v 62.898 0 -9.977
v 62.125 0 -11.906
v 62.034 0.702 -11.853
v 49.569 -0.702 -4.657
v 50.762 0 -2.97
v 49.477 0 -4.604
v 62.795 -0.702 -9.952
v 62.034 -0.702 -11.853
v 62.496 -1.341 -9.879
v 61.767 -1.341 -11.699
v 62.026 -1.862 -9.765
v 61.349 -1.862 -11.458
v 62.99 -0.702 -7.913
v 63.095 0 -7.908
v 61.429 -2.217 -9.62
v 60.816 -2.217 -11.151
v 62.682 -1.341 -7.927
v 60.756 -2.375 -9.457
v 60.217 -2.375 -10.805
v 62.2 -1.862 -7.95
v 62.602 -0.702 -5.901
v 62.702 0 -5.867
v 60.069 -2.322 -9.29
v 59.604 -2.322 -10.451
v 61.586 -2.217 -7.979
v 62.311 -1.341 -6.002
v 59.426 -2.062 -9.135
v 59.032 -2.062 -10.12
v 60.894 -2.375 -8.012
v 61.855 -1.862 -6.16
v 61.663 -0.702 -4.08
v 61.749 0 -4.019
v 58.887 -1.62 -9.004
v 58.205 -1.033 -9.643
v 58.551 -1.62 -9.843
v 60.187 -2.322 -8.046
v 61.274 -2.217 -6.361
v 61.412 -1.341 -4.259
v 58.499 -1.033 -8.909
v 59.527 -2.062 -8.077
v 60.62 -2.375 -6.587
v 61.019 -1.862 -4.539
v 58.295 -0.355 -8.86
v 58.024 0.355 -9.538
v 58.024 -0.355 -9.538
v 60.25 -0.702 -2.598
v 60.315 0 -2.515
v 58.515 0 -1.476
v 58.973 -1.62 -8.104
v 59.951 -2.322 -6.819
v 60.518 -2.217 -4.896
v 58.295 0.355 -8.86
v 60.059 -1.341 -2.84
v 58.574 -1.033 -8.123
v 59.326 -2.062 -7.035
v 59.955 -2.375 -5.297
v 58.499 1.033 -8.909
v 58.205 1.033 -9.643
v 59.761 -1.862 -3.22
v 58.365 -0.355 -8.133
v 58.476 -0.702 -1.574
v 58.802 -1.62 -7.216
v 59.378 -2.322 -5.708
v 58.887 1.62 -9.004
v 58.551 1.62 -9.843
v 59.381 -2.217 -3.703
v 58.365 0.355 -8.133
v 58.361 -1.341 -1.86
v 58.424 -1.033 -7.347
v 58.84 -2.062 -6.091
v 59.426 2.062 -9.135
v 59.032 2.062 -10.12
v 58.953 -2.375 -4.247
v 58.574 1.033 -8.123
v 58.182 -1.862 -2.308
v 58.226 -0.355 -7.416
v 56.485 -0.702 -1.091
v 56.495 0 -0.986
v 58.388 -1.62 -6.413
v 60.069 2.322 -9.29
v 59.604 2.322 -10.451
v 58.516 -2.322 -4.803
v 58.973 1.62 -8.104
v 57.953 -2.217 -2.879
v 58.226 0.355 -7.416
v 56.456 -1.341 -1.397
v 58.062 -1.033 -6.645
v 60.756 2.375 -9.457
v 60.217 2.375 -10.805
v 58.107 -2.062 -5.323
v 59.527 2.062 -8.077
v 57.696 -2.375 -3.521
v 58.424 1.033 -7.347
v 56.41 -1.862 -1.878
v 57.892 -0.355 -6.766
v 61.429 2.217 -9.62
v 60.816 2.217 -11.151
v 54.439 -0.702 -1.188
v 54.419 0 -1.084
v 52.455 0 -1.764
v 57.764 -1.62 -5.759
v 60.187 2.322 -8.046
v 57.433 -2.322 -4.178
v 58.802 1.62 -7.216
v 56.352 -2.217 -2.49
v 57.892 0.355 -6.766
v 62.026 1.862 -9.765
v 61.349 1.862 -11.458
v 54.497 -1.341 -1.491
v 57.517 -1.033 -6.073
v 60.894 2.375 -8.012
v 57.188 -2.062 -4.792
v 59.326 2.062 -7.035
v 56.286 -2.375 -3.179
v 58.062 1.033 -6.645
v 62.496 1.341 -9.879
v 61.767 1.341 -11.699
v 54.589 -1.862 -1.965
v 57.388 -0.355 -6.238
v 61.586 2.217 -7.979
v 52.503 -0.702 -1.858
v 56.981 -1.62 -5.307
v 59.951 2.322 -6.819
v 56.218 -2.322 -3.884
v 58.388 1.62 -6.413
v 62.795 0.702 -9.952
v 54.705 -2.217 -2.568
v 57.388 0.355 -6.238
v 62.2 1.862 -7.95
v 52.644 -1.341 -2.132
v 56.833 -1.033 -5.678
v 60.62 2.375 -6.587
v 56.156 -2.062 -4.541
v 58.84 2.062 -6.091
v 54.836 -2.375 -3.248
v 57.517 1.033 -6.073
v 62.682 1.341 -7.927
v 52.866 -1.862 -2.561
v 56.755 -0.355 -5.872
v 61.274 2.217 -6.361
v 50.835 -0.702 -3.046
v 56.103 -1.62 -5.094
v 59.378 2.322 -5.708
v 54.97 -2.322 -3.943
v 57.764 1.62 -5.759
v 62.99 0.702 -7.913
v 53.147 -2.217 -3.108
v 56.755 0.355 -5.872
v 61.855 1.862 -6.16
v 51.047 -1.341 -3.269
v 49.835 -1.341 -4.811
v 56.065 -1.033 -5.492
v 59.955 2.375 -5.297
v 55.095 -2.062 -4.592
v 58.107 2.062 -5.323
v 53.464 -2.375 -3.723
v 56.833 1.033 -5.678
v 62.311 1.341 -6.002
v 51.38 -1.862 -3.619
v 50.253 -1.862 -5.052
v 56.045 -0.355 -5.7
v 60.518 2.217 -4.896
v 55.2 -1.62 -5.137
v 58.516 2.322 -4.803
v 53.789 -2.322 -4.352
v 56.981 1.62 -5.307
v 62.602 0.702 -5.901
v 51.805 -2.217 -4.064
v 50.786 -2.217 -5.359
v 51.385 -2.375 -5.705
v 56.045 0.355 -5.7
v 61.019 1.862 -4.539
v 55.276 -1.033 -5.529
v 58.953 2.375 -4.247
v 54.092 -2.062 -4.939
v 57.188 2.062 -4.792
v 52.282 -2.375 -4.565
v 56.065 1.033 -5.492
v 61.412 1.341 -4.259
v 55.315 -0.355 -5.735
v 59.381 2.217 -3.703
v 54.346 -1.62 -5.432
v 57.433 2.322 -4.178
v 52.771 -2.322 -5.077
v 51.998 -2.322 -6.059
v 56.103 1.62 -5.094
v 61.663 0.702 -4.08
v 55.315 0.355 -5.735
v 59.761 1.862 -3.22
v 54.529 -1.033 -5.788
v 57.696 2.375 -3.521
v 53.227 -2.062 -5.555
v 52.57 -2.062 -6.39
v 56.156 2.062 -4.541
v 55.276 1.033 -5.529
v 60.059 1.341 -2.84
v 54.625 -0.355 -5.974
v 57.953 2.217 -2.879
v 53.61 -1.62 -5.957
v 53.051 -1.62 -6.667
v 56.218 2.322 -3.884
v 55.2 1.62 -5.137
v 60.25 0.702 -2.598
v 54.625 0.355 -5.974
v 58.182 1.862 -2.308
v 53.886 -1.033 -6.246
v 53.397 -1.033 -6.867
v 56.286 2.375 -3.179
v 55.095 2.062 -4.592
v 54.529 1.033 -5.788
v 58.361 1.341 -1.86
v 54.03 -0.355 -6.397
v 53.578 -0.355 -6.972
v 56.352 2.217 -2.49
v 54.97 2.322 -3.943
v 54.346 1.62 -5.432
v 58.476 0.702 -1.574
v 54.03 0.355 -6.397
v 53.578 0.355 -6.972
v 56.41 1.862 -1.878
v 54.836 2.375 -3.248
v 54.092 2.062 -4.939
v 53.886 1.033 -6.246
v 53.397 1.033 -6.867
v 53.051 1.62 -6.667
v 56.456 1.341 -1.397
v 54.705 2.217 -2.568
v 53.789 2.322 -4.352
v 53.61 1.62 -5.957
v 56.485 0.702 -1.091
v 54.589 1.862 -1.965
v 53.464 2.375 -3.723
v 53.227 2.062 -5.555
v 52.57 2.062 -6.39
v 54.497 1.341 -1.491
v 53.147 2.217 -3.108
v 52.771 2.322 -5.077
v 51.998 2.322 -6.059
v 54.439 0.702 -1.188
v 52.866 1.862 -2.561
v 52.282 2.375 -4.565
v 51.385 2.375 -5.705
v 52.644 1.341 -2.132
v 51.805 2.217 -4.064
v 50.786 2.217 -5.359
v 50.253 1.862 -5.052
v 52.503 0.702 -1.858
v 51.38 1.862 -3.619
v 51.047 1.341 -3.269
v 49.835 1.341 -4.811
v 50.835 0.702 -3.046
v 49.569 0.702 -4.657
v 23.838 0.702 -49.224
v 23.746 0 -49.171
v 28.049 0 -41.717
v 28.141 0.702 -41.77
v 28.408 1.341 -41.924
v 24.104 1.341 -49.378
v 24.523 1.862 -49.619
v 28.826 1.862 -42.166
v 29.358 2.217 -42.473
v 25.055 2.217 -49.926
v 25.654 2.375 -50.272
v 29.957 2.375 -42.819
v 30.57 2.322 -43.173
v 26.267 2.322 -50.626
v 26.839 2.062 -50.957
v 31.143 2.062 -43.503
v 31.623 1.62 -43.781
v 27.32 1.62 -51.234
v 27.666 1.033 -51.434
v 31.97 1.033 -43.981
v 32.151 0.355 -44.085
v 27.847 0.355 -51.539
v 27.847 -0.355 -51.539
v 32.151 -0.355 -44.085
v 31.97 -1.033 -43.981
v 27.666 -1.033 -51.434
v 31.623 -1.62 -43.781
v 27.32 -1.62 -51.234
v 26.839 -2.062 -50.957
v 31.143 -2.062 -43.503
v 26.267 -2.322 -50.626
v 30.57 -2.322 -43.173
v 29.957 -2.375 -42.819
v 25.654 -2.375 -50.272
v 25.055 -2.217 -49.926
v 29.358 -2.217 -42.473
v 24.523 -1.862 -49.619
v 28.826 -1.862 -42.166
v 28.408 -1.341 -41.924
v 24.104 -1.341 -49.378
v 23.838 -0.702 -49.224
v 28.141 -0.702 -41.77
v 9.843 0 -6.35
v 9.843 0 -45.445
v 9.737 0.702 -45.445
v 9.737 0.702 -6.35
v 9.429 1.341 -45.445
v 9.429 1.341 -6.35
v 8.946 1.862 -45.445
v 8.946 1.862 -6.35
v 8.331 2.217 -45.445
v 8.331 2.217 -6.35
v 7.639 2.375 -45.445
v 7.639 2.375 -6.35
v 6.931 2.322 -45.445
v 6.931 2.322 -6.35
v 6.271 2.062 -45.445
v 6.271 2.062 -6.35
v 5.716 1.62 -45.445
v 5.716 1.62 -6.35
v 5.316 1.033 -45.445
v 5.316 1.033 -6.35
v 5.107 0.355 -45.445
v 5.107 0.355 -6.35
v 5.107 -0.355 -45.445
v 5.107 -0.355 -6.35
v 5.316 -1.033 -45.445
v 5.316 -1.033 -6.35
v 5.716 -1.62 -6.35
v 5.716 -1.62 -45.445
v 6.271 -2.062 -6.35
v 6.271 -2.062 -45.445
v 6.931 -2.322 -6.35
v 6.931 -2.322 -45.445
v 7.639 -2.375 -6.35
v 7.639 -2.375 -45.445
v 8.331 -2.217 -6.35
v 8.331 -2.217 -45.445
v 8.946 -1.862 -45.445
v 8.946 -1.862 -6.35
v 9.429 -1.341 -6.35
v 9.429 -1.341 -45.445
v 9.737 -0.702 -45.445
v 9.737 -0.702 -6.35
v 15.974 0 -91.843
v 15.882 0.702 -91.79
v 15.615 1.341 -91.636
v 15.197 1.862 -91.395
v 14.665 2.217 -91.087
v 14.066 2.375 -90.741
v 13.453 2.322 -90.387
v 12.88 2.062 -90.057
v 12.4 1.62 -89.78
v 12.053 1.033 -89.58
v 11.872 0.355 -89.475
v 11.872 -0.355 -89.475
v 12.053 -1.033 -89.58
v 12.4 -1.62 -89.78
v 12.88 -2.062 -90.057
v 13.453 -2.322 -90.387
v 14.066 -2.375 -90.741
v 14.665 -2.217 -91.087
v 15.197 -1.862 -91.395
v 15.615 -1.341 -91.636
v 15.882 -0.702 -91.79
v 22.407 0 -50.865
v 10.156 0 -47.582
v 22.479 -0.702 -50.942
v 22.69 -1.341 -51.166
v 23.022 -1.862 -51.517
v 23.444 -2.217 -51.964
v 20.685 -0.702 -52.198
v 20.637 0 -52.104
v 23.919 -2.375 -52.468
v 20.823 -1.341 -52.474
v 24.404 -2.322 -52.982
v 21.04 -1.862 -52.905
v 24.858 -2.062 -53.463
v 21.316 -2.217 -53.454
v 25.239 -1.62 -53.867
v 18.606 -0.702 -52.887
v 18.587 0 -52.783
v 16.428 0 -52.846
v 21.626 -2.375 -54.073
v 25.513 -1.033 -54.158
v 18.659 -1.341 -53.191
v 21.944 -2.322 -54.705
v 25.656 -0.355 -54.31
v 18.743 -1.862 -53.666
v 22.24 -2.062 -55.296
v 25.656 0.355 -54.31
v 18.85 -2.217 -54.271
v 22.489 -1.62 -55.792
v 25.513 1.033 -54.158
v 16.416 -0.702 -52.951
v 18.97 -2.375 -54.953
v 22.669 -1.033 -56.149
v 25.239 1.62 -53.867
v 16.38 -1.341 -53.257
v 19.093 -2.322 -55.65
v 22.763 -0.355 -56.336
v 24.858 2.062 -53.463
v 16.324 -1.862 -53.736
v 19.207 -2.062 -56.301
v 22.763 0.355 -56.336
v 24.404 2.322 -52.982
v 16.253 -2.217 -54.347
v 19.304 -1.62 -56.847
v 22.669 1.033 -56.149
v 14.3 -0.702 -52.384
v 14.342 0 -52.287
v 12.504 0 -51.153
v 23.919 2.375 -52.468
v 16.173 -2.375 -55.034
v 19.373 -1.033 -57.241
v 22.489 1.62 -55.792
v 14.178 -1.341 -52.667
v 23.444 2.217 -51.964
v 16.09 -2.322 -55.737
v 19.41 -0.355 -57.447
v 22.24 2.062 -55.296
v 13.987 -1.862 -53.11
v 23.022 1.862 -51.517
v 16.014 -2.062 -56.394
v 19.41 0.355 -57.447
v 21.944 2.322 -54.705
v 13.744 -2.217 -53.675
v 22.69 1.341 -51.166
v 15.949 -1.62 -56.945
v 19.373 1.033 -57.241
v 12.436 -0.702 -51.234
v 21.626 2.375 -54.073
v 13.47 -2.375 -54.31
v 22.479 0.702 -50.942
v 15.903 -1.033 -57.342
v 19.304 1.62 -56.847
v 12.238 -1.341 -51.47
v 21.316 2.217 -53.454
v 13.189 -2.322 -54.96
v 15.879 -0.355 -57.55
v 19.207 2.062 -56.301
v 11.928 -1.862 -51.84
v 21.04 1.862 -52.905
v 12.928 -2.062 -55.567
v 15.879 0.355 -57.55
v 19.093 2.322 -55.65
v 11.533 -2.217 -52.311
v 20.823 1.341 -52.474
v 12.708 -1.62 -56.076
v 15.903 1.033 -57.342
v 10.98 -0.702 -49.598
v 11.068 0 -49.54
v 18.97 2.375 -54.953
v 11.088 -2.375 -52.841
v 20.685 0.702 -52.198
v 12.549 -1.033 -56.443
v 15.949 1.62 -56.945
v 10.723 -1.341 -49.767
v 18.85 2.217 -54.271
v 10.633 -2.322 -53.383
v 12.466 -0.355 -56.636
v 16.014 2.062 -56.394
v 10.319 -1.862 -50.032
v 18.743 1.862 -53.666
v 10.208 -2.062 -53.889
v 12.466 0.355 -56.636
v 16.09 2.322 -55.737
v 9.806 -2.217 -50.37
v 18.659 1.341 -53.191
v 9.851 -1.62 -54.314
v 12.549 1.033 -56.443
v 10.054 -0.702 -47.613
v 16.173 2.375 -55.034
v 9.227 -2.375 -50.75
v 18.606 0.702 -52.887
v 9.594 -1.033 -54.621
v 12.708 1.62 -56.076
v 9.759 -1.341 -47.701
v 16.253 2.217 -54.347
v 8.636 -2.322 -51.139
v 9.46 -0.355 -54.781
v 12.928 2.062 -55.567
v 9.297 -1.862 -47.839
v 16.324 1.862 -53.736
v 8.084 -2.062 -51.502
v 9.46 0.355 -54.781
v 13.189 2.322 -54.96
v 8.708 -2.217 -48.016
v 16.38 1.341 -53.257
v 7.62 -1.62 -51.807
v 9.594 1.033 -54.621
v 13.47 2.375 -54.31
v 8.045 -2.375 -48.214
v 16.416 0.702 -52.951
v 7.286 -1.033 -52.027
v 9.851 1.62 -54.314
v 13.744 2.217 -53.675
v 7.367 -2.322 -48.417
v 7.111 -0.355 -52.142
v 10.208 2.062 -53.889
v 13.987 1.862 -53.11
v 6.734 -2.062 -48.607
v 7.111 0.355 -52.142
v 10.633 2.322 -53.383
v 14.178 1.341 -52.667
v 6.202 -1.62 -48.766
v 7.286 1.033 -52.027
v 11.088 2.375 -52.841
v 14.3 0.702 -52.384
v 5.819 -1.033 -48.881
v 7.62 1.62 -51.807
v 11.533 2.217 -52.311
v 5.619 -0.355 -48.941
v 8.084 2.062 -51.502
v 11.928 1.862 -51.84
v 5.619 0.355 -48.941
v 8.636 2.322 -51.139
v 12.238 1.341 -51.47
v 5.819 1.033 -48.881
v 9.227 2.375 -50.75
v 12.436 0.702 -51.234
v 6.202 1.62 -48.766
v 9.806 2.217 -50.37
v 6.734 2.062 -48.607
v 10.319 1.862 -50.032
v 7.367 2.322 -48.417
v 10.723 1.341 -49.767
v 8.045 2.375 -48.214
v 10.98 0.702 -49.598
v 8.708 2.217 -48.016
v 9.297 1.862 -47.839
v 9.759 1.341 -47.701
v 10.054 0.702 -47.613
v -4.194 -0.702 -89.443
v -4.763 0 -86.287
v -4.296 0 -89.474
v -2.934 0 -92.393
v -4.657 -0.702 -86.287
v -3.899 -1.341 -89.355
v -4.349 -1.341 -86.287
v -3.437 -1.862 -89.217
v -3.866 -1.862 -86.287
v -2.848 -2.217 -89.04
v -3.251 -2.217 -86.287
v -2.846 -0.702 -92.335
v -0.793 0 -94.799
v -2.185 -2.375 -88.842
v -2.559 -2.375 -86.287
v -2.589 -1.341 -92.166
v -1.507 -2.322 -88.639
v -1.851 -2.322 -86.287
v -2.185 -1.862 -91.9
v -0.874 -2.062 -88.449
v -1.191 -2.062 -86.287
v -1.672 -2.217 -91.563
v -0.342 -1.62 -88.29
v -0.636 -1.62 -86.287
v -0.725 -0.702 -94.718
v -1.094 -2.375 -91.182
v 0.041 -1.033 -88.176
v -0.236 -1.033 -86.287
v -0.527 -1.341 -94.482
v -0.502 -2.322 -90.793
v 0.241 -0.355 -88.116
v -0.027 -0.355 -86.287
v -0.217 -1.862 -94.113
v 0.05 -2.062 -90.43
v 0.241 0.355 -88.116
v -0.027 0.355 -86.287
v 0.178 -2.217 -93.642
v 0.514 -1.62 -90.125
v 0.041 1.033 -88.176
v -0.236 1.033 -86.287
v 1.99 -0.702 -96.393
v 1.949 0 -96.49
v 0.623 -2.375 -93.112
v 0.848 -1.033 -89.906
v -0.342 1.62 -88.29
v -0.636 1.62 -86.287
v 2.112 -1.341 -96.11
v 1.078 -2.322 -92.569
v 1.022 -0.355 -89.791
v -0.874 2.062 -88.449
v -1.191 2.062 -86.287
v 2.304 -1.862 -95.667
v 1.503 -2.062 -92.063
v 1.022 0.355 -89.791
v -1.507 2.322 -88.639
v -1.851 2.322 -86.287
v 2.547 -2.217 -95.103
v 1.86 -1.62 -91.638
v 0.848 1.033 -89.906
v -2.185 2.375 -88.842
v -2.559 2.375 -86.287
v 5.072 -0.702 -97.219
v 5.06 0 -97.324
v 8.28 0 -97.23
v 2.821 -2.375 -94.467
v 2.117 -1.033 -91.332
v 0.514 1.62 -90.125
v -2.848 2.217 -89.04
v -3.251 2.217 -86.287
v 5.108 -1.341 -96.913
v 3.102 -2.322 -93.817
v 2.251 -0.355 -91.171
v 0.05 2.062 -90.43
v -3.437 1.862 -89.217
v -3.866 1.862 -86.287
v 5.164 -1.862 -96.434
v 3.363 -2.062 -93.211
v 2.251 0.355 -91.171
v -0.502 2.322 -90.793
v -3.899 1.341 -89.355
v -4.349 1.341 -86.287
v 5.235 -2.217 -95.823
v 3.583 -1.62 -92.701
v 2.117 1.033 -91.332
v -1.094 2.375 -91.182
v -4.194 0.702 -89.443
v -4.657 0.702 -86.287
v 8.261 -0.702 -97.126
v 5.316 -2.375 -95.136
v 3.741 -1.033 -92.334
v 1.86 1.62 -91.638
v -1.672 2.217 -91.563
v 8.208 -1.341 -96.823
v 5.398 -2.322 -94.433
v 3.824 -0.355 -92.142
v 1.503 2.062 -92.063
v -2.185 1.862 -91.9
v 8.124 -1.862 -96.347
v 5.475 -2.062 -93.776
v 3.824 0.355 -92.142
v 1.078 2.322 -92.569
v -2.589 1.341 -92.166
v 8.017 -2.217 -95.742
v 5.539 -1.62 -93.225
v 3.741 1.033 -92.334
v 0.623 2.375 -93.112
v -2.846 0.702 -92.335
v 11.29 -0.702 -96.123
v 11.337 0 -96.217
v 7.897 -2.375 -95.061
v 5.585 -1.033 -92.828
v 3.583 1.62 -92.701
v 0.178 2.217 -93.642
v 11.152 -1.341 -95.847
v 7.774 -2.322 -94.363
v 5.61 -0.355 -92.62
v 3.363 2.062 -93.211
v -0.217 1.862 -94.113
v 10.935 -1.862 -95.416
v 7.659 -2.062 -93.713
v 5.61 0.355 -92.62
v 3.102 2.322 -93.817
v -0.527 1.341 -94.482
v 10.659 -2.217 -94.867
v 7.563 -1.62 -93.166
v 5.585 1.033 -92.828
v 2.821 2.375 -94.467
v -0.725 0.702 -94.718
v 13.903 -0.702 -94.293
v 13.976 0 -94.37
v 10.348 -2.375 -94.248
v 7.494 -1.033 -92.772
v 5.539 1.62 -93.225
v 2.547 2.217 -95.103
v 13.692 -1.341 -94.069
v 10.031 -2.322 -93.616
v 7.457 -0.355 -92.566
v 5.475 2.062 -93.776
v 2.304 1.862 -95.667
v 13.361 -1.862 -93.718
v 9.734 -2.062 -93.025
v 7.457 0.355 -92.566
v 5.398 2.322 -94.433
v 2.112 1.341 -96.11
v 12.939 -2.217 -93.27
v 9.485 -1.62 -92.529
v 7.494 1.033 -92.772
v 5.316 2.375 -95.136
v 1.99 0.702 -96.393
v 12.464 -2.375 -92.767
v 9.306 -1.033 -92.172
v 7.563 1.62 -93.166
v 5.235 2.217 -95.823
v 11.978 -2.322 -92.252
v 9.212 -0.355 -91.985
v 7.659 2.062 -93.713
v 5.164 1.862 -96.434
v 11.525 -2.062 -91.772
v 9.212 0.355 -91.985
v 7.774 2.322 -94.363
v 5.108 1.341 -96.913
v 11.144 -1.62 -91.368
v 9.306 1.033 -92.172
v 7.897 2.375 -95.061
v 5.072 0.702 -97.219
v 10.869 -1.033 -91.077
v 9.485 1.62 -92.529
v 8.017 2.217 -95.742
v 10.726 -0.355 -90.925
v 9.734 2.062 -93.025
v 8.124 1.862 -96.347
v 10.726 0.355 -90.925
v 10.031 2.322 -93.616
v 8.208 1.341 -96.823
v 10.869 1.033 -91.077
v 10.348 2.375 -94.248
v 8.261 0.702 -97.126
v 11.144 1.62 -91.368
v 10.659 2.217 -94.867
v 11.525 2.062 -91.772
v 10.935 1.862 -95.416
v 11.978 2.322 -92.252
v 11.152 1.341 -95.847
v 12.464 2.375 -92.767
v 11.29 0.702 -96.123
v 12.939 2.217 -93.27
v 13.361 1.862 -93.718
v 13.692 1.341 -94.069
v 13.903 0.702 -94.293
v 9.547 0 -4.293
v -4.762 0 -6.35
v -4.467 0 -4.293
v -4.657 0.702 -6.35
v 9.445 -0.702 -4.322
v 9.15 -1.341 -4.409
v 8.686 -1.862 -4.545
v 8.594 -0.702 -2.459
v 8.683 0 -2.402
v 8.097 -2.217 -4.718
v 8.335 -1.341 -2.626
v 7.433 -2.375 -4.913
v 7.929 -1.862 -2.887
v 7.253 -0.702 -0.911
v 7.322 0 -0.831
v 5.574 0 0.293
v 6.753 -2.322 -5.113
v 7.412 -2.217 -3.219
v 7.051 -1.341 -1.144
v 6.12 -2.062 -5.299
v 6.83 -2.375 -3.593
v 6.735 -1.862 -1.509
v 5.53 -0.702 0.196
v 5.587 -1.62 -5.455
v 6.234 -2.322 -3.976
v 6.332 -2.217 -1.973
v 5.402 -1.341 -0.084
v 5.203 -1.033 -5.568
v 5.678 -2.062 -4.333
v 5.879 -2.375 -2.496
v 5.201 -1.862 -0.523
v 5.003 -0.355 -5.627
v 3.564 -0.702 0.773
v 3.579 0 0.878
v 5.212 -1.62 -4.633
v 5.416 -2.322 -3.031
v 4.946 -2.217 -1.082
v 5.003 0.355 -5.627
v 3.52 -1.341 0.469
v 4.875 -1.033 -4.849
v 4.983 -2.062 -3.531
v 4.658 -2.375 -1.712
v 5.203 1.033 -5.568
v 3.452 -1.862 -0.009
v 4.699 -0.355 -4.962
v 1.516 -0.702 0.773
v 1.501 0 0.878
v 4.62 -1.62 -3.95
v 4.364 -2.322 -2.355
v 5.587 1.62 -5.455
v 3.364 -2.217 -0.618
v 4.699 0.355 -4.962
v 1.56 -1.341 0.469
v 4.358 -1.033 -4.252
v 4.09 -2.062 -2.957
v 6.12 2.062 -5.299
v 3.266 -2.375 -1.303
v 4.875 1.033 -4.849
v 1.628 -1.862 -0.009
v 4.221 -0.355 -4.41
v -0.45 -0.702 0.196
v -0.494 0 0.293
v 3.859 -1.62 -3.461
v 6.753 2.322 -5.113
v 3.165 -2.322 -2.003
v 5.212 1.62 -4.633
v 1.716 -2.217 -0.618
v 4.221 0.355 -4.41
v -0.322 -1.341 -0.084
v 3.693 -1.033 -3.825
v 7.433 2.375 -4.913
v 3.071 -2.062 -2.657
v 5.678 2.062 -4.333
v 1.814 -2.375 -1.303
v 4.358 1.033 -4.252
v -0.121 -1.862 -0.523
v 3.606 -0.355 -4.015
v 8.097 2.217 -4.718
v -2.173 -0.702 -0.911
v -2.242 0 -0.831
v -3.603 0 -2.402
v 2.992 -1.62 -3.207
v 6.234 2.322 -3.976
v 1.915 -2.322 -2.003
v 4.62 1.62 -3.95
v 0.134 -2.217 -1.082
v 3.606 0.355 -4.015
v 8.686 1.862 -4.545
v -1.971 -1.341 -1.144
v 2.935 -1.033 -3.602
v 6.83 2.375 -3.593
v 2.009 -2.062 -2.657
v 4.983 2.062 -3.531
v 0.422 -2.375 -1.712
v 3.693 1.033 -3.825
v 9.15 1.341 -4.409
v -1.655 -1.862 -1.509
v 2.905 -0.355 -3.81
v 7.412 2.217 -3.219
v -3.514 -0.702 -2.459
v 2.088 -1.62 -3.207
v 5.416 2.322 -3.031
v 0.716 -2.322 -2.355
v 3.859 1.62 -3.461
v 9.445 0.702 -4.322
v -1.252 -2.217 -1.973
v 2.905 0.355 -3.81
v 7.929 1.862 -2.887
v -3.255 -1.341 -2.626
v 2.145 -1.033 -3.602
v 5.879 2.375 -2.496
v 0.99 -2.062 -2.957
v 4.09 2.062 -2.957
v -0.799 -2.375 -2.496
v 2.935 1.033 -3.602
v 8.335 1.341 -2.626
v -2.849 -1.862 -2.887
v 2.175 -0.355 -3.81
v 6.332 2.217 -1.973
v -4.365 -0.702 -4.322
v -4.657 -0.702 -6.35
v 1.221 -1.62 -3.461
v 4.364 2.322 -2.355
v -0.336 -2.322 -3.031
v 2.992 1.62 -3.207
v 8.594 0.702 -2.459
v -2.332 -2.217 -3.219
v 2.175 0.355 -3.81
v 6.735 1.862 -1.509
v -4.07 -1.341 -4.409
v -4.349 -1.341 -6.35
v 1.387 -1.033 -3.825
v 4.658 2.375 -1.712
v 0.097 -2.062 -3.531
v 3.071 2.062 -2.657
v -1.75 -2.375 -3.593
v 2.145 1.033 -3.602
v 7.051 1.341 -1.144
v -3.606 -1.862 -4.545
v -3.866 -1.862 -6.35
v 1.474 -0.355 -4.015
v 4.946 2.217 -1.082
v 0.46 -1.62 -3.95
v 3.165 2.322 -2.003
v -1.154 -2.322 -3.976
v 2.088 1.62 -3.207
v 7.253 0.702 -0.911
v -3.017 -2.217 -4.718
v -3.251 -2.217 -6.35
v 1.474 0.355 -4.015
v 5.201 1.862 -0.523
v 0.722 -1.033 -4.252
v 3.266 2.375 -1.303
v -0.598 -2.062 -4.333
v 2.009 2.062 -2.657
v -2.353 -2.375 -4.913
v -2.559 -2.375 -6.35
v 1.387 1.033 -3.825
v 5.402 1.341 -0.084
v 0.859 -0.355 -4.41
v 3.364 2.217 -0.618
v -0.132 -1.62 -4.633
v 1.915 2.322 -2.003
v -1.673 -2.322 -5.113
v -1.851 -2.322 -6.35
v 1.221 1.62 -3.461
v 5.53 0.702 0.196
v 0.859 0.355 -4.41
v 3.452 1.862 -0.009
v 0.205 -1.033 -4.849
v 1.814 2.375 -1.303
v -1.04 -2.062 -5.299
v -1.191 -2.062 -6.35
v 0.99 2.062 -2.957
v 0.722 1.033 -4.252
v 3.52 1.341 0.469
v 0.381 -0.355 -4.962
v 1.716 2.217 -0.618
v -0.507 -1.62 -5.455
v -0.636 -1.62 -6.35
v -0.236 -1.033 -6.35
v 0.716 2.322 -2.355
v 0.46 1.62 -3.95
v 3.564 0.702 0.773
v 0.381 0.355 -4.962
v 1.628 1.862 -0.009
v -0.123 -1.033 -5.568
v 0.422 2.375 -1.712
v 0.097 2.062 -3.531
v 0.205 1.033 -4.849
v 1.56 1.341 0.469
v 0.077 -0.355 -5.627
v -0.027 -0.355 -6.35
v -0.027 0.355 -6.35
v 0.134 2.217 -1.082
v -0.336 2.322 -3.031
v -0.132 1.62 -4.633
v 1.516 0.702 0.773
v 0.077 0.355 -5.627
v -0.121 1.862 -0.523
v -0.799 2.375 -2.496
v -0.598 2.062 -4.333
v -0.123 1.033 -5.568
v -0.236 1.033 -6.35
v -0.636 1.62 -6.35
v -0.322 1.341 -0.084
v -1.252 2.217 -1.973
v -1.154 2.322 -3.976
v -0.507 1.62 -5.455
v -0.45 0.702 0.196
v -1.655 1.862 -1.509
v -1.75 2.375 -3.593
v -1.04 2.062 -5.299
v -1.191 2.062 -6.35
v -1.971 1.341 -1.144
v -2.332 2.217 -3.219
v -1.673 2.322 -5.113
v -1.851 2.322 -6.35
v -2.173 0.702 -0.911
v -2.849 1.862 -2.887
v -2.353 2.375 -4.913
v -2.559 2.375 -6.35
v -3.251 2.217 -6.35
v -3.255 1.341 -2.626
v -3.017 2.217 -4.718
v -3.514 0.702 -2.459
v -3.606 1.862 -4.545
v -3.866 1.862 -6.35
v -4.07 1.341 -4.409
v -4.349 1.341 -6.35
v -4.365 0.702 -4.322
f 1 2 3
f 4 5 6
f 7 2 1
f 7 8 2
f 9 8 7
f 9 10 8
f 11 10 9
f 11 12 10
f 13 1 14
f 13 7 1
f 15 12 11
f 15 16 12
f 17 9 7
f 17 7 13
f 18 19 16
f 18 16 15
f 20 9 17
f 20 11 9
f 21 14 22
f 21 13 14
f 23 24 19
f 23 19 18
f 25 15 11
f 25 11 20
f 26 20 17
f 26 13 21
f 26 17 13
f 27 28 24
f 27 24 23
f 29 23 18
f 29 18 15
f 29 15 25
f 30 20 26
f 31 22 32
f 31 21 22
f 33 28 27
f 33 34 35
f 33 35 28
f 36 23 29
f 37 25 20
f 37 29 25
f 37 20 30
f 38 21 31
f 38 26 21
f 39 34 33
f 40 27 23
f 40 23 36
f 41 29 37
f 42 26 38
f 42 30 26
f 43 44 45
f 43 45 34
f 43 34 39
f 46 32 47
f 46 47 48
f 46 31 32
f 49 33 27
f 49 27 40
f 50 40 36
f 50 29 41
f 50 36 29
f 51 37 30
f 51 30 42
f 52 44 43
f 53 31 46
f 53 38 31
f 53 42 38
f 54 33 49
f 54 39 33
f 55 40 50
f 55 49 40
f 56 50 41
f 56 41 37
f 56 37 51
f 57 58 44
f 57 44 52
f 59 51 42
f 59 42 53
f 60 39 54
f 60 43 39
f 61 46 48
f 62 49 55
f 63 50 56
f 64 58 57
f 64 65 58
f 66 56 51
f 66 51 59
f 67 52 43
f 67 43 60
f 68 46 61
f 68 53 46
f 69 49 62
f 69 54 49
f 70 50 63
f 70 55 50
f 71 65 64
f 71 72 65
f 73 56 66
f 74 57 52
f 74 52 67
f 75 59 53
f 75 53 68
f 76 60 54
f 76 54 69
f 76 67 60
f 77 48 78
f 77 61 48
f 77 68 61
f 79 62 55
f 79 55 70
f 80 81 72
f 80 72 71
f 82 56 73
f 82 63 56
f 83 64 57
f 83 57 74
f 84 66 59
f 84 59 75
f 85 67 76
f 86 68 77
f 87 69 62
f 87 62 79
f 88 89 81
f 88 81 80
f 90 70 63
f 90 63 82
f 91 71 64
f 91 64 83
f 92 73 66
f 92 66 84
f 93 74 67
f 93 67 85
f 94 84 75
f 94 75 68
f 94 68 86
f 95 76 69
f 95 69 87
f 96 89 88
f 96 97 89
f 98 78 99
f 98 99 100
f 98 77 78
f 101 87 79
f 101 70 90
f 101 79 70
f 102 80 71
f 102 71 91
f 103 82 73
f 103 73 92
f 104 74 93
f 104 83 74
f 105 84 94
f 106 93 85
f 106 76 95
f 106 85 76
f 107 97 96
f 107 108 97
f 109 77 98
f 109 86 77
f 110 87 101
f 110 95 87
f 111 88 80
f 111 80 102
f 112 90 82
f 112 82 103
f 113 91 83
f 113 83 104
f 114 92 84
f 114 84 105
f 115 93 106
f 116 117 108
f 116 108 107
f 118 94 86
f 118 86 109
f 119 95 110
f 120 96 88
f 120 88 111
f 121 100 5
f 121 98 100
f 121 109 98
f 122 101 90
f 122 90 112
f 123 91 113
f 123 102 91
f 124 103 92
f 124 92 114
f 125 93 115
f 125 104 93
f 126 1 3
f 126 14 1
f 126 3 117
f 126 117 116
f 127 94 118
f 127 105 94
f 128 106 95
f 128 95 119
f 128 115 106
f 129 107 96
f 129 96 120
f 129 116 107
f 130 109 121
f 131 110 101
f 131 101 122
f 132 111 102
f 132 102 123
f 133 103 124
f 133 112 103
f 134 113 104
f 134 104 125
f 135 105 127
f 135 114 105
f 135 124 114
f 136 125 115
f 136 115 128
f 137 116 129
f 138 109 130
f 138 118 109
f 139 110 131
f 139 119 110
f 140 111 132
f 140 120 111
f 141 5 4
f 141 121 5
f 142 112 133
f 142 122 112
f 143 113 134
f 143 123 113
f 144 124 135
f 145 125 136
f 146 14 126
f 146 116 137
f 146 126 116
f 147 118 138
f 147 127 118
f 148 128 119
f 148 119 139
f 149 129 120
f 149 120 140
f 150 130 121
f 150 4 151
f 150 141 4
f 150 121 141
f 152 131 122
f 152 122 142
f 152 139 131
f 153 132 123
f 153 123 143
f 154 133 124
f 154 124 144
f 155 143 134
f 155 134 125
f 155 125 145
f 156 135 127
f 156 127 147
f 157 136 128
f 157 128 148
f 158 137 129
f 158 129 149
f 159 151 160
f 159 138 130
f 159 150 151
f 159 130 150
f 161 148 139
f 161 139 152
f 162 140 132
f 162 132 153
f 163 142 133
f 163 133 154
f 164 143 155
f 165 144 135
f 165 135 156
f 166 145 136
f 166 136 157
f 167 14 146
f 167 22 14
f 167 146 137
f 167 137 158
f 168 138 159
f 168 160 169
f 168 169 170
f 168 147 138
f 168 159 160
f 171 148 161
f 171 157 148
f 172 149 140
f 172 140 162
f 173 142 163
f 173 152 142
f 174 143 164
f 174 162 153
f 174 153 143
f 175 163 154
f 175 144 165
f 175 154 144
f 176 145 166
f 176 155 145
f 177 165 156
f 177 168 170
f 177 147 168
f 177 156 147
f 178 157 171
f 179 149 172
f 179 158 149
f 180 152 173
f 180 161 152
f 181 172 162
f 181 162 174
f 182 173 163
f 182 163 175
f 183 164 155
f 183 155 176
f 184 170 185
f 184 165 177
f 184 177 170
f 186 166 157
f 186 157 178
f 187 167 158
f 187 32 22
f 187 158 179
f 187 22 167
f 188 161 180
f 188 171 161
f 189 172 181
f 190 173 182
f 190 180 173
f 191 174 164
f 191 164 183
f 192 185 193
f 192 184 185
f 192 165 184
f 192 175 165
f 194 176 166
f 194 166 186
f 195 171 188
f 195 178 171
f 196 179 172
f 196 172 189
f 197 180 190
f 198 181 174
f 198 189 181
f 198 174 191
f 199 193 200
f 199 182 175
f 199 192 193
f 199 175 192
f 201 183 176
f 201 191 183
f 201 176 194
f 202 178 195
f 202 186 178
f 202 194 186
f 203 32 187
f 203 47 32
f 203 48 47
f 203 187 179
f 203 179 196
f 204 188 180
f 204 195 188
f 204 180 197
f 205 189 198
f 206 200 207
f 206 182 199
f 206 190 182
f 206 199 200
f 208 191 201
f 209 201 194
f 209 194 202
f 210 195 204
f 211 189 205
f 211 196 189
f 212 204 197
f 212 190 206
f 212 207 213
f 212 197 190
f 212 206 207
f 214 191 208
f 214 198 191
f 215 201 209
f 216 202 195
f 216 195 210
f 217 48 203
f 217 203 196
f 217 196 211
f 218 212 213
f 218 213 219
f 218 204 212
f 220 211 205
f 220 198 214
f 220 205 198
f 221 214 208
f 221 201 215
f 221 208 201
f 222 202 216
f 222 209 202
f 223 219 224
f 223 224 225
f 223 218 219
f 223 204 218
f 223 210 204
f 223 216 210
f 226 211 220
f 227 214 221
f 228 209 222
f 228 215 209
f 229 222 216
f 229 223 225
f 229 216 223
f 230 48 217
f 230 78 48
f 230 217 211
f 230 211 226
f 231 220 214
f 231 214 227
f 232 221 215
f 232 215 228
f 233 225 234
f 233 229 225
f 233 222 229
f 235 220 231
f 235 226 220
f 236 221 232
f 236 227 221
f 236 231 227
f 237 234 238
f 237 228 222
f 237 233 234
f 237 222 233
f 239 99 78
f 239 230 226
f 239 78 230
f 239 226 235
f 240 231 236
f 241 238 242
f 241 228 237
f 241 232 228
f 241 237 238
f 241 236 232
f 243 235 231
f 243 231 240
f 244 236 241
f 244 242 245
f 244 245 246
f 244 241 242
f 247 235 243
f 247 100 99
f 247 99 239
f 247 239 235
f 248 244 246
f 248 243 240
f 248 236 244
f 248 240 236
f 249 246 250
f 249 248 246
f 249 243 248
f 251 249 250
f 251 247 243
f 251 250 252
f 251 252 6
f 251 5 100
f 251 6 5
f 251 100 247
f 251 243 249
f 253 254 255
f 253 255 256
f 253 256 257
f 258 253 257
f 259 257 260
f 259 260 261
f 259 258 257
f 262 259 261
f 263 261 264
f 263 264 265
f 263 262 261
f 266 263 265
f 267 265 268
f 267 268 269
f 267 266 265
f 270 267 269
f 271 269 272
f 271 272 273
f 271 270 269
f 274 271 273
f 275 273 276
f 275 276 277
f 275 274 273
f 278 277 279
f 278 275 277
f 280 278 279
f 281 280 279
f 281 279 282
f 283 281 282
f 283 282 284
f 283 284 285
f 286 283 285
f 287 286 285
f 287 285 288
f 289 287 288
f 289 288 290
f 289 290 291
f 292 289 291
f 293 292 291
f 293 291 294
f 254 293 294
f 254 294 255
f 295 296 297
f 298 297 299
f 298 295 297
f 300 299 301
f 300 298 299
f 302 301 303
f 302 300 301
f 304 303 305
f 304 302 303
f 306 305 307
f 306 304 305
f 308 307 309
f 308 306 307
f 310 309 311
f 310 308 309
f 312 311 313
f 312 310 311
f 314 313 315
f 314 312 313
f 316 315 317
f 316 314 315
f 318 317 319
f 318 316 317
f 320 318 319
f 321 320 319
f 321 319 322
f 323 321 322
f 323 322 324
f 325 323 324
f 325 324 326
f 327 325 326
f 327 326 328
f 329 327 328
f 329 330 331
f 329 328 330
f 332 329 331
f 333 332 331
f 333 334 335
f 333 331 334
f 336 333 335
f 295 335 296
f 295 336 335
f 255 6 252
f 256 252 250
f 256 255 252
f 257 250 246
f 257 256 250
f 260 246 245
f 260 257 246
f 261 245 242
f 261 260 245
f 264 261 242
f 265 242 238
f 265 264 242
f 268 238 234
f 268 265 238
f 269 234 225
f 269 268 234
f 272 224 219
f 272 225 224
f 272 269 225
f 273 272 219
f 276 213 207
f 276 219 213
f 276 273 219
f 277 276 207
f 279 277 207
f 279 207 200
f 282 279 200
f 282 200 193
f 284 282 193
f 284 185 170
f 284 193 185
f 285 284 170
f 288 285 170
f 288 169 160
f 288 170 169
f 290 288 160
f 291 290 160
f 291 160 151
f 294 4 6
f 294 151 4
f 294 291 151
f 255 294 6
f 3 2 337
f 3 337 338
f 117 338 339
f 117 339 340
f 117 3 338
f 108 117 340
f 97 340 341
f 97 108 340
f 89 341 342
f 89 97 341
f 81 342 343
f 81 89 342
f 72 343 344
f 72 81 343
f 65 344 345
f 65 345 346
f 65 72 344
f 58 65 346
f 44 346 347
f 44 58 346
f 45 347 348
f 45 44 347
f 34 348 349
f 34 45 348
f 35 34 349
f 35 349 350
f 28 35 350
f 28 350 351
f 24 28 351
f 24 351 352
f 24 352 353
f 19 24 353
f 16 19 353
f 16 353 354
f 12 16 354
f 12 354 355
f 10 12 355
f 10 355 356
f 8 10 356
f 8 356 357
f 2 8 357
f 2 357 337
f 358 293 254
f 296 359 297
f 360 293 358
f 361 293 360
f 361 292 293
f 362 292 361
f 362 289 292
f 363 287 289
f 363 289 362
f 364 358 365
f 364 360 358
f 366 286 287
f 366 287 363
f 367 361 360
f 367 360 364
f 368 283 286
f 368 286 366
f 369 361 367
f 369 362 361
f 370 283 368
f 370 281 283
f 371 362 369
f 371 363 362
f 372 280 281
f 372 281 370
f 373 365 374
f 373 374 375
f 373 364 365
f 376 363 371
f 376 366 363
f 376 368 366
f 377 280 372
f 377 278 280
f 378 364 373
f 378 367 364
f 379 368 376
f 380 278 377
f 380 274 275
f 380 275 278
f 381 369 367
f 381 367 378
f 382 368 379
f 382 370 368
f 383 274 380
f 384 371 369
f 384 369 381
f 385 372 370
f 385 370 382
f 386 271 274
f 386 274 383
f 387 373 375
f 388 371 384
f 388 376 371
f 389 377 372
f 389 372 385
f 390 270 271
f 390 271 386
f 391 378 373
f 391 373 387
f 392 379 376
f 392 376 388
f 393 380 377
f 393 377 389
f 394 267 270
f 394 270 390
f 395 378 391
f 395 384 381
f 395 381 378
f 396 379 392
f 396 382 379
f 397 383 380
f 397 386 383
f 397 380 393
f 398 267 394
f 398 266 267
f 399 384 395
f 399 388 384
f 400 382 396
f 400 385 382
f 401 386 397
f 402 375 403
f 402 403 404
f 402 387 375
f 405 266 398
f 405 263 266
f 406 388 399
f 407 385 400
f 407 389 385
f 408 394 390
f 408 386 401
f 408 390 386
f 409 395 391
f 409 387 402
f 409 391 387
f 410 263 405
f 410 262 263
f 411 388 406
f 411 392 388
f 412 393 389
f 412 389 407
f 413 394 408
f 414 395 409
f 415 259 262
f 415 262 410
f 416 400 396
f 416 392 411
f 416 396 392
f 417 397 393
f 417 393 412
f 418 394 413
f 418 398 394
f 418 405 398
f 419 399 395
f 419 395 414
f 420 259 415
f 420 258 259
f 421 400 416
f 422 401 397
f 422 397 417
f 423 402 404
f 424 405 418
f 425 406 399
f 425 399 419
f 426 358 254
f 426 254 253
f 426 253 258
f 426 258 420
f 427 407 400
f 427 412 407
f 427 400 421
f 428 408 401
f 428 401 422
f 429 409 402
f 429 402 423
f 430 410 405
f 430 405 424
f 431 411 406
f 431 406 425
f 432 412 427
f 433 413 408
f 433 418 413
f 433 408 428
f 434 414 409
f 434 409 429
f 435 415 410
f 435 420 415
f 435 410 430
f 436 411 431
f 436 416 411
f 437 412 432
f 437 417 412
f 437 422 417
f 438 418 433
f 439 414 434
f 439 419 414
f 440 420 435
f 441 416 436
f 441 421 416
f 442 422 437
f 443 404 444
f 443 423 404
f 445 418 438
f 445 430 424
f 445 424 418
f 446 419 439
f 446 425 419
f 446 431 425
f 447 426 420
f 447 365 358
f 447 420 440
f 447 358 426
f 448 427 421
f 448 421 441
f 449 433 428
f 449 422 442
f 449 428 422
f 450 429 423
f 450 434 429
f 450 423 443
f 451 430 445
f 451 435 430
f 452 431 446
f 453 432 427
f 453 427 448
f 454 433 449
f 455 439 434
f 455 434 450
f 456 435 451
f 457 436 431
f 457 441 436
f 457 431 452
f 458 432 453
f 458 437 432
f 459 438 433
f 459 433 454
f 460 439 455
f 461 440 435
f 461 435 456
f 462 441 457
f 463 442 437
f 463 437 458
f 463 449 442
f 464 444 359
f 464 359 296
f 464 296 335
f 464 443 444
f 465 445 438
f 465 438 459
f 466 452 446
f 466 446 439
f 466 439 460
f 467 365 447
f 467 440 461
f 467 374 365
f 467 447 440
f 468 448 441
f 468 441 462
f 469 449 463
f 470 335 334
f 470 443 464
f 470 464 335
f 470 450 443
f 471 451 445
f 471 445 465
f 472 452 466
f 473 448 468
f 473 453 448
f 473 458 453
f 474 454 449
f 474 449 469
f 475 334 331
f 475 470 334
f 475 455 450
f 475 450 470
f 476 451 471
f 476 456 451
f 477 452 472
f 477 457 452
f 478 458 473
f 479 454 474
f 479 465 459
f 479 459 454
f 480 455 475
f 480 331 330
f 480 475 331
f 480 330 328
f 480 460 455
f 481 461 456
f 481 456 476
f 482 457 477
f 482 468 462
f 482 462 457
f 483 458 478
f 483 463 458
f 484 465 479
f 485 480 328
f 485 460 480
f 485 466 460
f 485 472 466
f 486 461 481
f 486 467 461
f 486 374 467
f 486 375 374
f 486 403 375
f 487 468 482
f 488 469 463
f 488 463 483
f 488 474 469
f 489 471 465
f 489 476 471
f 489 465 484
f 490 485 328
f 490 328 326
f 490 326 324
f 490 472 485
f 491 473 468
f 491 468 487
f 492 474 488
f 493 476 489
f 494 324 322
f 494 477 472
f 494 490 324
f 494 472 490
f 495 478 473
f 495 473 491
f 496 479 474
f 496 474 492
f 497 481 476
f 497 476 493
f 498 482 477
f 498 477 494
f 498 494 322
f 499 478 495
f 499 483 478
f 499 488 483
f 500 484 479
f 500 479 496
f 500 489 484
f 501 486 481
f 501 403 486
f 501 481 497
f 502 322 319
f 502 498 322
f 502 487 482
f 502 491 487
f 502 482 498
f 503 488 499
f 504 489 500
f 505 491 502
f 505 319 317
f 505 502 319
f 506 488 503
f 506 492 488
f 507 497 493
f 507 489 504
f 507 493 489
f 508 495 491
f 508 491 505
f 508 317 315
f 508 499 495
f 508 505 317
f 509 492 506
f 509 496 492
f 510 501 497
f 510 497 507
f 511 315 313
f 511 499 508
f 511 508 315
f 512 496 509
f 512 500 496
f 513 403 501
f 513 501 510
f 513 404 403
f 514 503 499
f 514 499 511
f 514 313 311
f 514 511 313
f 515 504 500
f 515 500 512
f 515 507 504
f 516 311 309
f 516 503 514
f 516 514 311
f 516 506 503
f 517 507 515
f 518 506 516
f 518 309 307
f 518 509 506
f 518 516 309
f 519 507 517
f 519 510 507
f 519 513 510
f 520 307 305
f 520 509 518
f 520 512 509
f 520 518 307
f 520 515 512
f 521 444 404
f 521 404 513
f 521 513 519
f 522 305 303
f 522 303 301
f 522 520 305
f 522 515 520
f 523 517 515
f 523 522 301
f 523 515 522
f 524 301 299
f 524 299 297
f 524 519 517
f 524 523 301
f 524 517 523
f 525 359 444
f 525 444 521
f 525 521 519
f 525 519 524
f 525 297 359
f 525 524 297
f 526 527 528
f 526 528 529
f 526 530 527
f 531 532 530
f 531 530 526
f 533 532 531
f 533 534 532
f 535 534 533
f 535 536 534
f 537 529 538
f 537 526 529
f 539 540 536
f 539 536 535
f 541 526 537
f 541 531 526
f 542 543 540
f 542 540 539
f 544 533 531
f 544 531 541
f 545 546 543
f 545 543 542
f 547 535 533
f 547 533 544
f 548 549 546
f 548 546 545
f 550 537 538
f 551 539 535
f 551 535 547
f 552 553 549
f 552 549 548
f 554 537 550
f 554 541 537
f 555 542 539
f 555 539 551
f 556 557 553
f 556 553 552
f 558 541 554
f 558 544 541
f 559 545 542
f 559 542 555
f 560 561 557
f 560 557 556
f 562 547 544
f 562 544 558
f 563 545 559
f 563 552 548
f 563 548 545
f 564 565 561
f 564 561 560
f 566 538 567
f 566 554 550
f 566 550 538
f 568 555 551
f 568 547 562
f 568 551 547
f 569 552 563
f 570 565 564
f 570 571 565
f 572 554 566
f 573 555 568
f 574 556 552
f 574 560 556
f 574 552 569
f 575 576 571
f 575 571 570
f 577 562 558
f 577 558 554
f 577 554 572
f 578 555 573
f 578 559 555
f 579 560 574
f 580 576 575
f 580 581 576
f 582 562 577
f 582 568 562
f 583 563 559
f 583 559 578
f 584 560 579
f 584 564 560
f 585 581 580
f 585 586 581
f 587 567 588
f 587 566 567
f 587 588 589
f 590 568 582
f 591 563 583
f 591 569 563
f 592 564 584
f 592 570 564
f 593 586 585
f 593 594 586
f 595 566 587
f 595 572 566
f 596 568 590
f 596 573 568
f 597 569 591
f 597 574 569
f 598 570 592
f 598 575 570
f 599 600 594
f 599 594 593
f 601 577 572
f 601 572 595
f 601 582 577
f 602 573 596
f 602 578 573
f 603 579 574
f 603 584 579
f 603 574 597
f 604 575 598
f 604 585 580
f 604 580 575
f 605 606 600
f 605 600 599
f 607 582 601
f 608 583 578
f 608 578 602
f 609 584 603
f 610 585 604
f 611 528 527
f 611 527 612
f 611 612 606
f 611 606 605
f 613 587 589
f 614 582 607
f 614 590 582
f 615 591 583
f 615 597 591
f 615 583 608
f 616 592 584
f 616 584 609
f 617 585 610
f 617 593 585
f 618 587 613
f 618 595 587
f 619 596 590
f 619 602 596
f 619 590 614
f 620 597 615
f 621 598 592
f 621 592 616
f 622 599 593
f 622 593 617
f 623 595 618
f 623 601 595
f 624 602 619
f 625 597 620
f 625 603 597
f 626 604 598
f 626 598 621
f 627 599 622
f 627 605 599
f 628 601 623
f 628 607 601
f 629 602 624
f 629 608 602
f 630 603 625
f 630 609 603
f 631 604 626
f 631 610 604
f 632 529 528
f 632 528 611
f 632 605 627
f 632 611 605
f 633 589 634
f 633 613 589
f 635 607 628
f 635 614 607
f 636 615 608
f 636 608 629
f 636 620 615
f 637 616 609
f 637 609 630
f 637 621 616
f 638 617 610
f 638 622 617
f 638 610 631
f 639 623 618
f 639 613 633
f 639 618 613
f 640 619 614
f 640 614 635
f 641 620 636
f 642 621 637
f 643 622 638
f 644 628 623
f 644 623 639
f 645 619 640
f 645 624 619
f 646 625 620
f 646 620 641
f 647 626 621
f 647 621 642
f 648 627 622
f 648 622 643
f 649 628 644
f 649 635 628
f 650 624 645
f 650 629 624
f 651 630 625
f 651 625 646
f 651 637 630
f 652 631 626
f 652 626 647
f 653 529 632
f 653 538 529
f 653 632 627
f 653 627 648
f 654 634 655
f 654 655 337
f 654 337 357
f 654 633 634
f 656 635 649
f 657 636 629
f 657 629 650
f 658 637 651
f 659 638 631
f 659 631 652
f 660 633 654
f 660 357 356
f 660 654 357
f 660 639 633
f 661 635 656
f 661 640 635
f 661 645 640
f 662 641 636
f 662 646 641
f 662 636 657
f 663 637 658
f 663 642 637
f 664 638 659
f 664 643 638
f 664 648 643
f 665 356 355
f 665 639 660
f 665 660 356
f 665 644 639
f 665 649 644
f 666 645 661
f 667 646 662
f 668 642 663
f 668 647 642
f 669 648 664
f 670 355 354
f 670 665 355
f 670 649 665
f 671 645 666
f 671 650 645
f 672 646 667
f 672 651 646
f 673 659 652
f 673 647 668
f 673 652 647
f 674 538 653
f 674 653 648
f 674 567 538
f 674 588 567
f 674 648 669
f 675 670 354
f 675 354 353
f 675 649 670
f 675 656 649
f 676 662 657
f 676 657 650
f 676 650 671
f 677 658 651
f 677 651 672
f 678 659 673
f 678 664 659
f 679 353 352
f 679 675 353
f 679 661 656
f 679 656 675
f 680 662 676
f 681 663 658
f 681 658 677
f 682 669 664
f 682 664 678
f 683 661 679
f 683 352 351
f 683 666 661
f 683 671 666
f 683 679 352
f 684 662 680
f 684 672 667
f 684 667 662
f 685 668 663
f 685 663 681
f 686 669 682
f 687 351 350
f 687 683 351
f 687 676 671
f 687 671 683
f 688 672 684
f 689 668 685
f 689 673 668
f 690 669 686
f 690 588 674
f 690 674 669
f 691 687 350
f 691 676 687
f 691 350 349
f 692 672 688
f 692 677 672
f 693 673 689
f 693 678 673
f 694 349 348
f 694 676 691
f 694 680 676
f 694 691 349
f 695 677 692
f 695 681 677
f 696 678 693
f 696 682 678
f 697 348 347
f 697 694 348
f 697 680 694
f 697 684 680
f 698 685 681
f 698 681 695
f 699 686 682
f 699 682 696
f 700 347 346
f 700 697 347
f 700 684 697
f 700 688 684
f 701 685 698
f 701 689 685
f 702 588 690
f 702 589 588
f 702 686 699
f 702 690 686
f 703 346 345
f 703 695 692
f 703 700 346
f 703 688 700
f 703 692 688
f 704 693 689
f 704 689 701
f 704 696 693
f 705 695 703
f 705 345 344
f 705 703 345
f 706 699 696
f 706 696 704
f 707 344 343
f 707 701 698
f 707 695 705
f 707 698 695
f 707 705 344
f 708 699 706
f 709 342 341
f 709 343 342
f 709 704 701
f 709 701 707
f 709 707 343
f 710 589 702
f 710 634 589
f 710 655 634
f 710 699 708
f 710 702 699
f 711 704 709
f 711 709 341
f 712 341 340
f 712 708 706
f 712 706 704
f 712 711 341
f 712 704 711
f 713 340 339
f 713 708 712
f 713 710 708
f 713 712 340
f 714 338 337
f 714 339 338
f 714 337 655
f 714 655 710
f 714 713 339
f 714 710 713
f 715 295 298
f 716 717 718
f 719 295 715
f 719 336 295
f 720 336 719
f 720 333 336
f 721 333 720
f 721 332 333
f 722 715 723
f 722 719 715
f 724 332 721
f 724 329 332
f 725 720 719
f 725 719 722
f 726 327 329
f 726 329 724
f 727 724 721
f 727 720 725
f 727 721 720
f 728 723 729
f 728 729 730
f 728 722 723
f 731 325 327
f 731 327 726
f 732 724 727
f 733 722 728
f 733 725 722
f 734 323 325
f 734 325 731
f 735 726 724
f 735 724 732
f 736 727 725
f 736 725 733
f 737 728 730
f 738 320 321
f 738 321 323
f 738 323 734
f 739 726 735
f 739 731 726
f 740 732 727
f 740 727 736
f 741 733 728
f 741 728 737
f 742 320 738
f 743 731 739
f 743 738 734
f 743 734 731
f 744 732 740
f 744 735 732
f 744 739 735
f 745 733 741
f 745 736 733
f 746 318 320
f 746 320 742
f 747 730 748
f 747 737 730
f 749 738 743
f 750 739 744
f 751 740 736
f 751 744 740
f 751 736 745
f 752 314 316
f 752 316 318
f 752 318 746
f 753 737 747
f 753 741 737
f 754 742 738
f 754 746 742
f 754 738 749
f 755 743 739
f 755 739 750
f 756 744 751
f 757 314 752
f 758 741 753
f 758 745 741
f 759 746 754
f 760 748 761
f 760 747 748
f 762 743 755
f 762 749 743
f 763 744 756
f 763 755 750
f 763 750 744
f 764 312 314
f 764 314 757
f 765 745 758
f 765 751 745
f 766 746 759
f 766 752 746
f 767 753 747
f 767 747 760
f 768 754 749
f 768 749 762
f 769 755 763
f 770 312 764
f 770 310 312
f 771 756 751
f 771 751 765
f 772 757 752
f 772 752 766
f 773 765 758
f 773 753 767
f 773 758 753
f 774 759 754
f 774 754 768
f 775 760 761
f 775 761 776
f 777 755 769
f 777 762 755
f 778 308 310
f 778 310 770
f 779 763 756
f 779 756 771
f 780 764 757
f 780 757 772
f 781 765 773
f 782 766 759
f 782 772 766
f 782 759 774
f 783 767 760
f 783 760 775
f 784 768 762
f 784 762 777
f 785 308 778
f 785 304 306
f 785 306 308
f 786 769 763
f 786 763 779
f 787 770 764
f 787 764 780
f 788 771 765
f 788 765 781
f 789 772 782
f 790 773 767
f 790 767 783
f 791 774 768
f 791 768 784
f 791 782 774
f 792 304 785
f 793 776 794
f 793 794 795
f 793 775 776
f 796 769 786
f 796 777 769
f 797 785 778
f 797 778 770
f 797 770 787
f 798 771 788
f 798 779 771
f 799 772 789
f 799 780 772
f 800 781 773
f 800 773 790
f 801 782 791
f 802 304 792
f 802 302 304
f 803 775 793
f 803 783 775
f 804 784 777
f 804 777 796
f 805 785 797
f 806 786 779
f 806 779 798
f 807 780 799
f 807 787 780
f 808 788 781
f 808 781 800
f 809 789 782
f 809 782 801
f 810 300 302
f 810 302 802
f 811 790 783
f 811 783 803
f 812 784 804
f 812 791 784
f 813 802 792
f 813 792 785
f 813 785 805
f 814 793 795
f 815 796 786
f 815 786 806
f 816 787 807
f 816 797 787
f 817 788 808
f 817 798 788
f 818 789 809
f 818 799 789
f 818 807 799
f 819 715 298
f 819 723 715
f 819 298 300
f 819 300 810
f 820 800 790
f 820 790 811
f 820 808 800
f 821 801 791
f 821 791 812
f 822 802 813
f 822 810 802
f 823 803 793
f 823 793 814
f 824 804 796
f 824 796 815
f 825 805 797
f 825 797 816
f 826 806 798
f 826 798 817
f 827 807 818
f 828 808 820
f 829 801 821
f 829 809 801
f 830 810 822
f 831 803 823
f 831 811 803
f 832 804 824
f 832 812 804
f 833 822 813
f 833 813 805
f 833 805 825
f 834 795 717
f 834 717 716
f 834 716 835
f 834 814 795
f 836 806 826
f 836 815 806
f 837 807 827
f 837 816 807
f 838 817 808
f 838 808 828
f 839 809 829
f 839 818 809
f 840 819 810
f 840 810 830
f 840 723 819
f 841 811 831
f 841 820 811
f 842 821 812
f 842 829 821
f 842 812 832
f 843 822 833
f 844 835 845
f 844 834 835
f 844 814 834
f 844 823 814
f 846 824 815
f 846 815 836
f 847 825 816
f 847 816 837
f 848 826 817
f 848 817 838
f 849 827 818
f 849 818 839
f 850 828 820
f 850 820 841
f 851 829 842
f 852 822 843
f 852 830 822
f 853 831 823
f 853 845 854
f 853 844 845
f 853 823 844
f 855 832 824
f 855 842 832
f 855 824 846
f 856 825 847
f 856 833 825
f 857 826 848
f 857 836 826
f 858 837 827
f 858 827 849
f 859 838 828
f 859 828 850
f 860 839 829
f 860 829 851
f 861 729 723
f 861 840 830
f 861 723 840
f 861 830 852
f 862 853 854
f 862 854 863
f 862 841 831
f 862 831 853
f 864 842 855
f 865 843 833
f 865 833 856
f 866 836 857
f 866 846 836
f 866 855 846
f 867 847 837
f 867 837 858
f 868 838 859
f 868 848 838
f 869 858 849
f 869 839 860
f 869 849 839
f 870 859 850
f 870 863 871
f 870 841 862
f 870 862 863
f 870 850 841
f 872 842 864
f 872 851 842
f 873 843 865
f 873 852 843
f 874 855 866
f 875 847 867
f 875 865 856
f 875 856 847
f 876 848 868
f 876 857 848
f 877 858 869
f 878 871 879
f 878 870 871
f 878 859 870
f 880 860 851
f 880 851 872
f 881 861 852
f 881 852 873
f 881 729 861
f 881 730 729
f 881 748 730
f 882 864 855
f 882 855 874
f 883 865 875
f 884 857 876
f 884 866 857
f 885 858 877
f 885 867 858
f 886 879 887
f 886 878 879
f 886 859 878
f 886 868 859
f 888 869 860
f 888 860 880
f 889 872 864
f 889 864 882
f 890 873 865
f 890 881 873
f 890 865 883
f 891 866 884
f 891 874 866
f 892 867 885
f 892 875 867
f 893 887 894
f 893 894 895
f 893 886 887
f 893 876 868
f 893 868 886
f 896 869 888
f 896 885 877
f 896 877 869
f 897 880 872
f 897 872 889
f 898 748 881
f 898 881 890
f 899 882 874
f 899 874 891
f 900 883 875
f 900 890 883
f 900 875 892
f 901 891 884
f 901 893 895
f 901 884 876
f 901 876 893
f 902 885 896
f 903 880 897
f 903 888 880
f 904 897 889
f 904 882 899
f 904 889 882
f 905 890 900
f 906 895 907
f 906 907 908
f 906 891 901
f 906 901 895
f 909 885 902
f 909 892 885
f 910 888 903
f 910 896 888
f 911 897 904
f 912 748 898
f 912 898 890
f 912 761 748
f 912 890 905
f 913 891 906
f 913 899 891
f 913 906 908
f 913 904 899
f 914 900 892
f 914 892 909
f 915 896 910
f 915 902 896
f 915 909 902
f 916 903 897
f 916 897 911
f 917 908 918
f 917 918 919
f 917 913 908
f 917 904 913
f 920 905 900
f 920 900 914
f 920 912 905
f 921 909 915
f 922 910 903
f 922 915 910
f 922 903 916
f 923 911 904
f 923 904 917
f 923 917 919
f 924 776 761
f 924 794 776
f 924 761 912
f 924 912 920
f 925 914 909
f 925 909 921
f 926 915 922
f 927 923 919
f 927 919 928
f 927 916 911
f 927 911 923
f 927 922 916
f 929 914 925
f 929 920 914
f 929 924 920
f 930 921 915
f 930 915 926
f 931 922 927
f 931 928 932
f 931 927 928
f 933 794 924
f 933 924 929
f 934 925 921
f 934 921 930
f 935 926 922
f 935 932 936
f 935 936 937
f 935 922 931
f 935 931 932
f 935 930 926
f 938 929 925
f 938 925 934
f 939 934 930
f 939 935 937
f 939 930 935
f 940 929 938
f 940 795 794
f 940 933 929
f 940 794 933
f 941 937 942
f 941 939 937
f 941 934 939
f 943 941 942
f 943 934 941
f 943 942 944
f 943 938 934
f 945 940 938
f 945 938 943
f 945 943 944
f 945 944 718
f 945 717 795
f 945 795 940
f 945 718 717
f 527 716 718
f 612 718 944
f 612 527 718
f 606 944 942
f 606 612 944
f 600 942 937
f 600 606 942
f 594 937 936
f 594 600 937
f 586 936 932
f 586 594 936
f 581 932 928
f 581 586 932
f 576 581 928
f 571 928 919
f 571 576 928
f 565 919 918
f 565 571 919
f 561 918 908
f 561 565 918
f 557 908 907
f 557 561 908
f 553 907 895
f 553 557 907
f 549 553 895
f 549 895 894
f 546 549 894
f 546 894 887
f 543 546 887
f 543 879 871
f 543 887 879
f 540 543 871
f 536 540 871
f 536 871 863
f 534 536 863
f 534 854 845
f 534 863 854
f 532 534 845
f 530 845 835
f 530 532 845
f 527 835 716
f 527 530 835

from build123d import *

# Parameters (mm, degrees)
SKETCH2_R = 2.38125


with BuildPart() as part:
    # Sweep1: sweep along a path in Sketch1
    with BuildLine(Plane(origin=(0, 0, 0), x_dir=(-1, 0, 0), z_dir=(0, -1, 0))) as sweep1_path:
        Line((-11.849261314, 89.461703653), (-58.000738686, 9.525))
        ThreePointArc((-58.000738686, 9.525), (-57.07103416, 6.055295474), (-53.601329635, 6.985))
        Line((-53.601329635, 6.985), (-32.17376215, 44.098635567))
        Line((-32.17376215, 44.098635567), (-27.870511969, 51.552083518))
        ThreePointArc((-27.870511969, 51.552083518), (-14.132338403, 57.242621331), (-5.08, 45.445384241))
        Line((-5.08, 45.445384241), (-5.08, 36.838883879))
        Line((-5.08, 36.838883879), (-5.08, 6.35))
        ThreePointArc((-5.08, 6.35), (-2.54, 3.81), (0, 6.35))
        Line((0, 6.35), (0, 86.286703653))
        ThreePointArc((0, 86.286703653), (-4.706499064, 92.420332649), (-11.849261314, 89.461703653))
    # Sketch2 → Sweep1 (sweep)
    with BuildSketch(Plane(origin=(0, 0, -21.594441939), x_dir=(-1, 0, 0), z_dir=(0, 0, -1))):
        with Locations((2.38125, 0)):
            Circle(SKETCH2_R)
    sweep(path=sweep1_path.line)


solid = part.part
